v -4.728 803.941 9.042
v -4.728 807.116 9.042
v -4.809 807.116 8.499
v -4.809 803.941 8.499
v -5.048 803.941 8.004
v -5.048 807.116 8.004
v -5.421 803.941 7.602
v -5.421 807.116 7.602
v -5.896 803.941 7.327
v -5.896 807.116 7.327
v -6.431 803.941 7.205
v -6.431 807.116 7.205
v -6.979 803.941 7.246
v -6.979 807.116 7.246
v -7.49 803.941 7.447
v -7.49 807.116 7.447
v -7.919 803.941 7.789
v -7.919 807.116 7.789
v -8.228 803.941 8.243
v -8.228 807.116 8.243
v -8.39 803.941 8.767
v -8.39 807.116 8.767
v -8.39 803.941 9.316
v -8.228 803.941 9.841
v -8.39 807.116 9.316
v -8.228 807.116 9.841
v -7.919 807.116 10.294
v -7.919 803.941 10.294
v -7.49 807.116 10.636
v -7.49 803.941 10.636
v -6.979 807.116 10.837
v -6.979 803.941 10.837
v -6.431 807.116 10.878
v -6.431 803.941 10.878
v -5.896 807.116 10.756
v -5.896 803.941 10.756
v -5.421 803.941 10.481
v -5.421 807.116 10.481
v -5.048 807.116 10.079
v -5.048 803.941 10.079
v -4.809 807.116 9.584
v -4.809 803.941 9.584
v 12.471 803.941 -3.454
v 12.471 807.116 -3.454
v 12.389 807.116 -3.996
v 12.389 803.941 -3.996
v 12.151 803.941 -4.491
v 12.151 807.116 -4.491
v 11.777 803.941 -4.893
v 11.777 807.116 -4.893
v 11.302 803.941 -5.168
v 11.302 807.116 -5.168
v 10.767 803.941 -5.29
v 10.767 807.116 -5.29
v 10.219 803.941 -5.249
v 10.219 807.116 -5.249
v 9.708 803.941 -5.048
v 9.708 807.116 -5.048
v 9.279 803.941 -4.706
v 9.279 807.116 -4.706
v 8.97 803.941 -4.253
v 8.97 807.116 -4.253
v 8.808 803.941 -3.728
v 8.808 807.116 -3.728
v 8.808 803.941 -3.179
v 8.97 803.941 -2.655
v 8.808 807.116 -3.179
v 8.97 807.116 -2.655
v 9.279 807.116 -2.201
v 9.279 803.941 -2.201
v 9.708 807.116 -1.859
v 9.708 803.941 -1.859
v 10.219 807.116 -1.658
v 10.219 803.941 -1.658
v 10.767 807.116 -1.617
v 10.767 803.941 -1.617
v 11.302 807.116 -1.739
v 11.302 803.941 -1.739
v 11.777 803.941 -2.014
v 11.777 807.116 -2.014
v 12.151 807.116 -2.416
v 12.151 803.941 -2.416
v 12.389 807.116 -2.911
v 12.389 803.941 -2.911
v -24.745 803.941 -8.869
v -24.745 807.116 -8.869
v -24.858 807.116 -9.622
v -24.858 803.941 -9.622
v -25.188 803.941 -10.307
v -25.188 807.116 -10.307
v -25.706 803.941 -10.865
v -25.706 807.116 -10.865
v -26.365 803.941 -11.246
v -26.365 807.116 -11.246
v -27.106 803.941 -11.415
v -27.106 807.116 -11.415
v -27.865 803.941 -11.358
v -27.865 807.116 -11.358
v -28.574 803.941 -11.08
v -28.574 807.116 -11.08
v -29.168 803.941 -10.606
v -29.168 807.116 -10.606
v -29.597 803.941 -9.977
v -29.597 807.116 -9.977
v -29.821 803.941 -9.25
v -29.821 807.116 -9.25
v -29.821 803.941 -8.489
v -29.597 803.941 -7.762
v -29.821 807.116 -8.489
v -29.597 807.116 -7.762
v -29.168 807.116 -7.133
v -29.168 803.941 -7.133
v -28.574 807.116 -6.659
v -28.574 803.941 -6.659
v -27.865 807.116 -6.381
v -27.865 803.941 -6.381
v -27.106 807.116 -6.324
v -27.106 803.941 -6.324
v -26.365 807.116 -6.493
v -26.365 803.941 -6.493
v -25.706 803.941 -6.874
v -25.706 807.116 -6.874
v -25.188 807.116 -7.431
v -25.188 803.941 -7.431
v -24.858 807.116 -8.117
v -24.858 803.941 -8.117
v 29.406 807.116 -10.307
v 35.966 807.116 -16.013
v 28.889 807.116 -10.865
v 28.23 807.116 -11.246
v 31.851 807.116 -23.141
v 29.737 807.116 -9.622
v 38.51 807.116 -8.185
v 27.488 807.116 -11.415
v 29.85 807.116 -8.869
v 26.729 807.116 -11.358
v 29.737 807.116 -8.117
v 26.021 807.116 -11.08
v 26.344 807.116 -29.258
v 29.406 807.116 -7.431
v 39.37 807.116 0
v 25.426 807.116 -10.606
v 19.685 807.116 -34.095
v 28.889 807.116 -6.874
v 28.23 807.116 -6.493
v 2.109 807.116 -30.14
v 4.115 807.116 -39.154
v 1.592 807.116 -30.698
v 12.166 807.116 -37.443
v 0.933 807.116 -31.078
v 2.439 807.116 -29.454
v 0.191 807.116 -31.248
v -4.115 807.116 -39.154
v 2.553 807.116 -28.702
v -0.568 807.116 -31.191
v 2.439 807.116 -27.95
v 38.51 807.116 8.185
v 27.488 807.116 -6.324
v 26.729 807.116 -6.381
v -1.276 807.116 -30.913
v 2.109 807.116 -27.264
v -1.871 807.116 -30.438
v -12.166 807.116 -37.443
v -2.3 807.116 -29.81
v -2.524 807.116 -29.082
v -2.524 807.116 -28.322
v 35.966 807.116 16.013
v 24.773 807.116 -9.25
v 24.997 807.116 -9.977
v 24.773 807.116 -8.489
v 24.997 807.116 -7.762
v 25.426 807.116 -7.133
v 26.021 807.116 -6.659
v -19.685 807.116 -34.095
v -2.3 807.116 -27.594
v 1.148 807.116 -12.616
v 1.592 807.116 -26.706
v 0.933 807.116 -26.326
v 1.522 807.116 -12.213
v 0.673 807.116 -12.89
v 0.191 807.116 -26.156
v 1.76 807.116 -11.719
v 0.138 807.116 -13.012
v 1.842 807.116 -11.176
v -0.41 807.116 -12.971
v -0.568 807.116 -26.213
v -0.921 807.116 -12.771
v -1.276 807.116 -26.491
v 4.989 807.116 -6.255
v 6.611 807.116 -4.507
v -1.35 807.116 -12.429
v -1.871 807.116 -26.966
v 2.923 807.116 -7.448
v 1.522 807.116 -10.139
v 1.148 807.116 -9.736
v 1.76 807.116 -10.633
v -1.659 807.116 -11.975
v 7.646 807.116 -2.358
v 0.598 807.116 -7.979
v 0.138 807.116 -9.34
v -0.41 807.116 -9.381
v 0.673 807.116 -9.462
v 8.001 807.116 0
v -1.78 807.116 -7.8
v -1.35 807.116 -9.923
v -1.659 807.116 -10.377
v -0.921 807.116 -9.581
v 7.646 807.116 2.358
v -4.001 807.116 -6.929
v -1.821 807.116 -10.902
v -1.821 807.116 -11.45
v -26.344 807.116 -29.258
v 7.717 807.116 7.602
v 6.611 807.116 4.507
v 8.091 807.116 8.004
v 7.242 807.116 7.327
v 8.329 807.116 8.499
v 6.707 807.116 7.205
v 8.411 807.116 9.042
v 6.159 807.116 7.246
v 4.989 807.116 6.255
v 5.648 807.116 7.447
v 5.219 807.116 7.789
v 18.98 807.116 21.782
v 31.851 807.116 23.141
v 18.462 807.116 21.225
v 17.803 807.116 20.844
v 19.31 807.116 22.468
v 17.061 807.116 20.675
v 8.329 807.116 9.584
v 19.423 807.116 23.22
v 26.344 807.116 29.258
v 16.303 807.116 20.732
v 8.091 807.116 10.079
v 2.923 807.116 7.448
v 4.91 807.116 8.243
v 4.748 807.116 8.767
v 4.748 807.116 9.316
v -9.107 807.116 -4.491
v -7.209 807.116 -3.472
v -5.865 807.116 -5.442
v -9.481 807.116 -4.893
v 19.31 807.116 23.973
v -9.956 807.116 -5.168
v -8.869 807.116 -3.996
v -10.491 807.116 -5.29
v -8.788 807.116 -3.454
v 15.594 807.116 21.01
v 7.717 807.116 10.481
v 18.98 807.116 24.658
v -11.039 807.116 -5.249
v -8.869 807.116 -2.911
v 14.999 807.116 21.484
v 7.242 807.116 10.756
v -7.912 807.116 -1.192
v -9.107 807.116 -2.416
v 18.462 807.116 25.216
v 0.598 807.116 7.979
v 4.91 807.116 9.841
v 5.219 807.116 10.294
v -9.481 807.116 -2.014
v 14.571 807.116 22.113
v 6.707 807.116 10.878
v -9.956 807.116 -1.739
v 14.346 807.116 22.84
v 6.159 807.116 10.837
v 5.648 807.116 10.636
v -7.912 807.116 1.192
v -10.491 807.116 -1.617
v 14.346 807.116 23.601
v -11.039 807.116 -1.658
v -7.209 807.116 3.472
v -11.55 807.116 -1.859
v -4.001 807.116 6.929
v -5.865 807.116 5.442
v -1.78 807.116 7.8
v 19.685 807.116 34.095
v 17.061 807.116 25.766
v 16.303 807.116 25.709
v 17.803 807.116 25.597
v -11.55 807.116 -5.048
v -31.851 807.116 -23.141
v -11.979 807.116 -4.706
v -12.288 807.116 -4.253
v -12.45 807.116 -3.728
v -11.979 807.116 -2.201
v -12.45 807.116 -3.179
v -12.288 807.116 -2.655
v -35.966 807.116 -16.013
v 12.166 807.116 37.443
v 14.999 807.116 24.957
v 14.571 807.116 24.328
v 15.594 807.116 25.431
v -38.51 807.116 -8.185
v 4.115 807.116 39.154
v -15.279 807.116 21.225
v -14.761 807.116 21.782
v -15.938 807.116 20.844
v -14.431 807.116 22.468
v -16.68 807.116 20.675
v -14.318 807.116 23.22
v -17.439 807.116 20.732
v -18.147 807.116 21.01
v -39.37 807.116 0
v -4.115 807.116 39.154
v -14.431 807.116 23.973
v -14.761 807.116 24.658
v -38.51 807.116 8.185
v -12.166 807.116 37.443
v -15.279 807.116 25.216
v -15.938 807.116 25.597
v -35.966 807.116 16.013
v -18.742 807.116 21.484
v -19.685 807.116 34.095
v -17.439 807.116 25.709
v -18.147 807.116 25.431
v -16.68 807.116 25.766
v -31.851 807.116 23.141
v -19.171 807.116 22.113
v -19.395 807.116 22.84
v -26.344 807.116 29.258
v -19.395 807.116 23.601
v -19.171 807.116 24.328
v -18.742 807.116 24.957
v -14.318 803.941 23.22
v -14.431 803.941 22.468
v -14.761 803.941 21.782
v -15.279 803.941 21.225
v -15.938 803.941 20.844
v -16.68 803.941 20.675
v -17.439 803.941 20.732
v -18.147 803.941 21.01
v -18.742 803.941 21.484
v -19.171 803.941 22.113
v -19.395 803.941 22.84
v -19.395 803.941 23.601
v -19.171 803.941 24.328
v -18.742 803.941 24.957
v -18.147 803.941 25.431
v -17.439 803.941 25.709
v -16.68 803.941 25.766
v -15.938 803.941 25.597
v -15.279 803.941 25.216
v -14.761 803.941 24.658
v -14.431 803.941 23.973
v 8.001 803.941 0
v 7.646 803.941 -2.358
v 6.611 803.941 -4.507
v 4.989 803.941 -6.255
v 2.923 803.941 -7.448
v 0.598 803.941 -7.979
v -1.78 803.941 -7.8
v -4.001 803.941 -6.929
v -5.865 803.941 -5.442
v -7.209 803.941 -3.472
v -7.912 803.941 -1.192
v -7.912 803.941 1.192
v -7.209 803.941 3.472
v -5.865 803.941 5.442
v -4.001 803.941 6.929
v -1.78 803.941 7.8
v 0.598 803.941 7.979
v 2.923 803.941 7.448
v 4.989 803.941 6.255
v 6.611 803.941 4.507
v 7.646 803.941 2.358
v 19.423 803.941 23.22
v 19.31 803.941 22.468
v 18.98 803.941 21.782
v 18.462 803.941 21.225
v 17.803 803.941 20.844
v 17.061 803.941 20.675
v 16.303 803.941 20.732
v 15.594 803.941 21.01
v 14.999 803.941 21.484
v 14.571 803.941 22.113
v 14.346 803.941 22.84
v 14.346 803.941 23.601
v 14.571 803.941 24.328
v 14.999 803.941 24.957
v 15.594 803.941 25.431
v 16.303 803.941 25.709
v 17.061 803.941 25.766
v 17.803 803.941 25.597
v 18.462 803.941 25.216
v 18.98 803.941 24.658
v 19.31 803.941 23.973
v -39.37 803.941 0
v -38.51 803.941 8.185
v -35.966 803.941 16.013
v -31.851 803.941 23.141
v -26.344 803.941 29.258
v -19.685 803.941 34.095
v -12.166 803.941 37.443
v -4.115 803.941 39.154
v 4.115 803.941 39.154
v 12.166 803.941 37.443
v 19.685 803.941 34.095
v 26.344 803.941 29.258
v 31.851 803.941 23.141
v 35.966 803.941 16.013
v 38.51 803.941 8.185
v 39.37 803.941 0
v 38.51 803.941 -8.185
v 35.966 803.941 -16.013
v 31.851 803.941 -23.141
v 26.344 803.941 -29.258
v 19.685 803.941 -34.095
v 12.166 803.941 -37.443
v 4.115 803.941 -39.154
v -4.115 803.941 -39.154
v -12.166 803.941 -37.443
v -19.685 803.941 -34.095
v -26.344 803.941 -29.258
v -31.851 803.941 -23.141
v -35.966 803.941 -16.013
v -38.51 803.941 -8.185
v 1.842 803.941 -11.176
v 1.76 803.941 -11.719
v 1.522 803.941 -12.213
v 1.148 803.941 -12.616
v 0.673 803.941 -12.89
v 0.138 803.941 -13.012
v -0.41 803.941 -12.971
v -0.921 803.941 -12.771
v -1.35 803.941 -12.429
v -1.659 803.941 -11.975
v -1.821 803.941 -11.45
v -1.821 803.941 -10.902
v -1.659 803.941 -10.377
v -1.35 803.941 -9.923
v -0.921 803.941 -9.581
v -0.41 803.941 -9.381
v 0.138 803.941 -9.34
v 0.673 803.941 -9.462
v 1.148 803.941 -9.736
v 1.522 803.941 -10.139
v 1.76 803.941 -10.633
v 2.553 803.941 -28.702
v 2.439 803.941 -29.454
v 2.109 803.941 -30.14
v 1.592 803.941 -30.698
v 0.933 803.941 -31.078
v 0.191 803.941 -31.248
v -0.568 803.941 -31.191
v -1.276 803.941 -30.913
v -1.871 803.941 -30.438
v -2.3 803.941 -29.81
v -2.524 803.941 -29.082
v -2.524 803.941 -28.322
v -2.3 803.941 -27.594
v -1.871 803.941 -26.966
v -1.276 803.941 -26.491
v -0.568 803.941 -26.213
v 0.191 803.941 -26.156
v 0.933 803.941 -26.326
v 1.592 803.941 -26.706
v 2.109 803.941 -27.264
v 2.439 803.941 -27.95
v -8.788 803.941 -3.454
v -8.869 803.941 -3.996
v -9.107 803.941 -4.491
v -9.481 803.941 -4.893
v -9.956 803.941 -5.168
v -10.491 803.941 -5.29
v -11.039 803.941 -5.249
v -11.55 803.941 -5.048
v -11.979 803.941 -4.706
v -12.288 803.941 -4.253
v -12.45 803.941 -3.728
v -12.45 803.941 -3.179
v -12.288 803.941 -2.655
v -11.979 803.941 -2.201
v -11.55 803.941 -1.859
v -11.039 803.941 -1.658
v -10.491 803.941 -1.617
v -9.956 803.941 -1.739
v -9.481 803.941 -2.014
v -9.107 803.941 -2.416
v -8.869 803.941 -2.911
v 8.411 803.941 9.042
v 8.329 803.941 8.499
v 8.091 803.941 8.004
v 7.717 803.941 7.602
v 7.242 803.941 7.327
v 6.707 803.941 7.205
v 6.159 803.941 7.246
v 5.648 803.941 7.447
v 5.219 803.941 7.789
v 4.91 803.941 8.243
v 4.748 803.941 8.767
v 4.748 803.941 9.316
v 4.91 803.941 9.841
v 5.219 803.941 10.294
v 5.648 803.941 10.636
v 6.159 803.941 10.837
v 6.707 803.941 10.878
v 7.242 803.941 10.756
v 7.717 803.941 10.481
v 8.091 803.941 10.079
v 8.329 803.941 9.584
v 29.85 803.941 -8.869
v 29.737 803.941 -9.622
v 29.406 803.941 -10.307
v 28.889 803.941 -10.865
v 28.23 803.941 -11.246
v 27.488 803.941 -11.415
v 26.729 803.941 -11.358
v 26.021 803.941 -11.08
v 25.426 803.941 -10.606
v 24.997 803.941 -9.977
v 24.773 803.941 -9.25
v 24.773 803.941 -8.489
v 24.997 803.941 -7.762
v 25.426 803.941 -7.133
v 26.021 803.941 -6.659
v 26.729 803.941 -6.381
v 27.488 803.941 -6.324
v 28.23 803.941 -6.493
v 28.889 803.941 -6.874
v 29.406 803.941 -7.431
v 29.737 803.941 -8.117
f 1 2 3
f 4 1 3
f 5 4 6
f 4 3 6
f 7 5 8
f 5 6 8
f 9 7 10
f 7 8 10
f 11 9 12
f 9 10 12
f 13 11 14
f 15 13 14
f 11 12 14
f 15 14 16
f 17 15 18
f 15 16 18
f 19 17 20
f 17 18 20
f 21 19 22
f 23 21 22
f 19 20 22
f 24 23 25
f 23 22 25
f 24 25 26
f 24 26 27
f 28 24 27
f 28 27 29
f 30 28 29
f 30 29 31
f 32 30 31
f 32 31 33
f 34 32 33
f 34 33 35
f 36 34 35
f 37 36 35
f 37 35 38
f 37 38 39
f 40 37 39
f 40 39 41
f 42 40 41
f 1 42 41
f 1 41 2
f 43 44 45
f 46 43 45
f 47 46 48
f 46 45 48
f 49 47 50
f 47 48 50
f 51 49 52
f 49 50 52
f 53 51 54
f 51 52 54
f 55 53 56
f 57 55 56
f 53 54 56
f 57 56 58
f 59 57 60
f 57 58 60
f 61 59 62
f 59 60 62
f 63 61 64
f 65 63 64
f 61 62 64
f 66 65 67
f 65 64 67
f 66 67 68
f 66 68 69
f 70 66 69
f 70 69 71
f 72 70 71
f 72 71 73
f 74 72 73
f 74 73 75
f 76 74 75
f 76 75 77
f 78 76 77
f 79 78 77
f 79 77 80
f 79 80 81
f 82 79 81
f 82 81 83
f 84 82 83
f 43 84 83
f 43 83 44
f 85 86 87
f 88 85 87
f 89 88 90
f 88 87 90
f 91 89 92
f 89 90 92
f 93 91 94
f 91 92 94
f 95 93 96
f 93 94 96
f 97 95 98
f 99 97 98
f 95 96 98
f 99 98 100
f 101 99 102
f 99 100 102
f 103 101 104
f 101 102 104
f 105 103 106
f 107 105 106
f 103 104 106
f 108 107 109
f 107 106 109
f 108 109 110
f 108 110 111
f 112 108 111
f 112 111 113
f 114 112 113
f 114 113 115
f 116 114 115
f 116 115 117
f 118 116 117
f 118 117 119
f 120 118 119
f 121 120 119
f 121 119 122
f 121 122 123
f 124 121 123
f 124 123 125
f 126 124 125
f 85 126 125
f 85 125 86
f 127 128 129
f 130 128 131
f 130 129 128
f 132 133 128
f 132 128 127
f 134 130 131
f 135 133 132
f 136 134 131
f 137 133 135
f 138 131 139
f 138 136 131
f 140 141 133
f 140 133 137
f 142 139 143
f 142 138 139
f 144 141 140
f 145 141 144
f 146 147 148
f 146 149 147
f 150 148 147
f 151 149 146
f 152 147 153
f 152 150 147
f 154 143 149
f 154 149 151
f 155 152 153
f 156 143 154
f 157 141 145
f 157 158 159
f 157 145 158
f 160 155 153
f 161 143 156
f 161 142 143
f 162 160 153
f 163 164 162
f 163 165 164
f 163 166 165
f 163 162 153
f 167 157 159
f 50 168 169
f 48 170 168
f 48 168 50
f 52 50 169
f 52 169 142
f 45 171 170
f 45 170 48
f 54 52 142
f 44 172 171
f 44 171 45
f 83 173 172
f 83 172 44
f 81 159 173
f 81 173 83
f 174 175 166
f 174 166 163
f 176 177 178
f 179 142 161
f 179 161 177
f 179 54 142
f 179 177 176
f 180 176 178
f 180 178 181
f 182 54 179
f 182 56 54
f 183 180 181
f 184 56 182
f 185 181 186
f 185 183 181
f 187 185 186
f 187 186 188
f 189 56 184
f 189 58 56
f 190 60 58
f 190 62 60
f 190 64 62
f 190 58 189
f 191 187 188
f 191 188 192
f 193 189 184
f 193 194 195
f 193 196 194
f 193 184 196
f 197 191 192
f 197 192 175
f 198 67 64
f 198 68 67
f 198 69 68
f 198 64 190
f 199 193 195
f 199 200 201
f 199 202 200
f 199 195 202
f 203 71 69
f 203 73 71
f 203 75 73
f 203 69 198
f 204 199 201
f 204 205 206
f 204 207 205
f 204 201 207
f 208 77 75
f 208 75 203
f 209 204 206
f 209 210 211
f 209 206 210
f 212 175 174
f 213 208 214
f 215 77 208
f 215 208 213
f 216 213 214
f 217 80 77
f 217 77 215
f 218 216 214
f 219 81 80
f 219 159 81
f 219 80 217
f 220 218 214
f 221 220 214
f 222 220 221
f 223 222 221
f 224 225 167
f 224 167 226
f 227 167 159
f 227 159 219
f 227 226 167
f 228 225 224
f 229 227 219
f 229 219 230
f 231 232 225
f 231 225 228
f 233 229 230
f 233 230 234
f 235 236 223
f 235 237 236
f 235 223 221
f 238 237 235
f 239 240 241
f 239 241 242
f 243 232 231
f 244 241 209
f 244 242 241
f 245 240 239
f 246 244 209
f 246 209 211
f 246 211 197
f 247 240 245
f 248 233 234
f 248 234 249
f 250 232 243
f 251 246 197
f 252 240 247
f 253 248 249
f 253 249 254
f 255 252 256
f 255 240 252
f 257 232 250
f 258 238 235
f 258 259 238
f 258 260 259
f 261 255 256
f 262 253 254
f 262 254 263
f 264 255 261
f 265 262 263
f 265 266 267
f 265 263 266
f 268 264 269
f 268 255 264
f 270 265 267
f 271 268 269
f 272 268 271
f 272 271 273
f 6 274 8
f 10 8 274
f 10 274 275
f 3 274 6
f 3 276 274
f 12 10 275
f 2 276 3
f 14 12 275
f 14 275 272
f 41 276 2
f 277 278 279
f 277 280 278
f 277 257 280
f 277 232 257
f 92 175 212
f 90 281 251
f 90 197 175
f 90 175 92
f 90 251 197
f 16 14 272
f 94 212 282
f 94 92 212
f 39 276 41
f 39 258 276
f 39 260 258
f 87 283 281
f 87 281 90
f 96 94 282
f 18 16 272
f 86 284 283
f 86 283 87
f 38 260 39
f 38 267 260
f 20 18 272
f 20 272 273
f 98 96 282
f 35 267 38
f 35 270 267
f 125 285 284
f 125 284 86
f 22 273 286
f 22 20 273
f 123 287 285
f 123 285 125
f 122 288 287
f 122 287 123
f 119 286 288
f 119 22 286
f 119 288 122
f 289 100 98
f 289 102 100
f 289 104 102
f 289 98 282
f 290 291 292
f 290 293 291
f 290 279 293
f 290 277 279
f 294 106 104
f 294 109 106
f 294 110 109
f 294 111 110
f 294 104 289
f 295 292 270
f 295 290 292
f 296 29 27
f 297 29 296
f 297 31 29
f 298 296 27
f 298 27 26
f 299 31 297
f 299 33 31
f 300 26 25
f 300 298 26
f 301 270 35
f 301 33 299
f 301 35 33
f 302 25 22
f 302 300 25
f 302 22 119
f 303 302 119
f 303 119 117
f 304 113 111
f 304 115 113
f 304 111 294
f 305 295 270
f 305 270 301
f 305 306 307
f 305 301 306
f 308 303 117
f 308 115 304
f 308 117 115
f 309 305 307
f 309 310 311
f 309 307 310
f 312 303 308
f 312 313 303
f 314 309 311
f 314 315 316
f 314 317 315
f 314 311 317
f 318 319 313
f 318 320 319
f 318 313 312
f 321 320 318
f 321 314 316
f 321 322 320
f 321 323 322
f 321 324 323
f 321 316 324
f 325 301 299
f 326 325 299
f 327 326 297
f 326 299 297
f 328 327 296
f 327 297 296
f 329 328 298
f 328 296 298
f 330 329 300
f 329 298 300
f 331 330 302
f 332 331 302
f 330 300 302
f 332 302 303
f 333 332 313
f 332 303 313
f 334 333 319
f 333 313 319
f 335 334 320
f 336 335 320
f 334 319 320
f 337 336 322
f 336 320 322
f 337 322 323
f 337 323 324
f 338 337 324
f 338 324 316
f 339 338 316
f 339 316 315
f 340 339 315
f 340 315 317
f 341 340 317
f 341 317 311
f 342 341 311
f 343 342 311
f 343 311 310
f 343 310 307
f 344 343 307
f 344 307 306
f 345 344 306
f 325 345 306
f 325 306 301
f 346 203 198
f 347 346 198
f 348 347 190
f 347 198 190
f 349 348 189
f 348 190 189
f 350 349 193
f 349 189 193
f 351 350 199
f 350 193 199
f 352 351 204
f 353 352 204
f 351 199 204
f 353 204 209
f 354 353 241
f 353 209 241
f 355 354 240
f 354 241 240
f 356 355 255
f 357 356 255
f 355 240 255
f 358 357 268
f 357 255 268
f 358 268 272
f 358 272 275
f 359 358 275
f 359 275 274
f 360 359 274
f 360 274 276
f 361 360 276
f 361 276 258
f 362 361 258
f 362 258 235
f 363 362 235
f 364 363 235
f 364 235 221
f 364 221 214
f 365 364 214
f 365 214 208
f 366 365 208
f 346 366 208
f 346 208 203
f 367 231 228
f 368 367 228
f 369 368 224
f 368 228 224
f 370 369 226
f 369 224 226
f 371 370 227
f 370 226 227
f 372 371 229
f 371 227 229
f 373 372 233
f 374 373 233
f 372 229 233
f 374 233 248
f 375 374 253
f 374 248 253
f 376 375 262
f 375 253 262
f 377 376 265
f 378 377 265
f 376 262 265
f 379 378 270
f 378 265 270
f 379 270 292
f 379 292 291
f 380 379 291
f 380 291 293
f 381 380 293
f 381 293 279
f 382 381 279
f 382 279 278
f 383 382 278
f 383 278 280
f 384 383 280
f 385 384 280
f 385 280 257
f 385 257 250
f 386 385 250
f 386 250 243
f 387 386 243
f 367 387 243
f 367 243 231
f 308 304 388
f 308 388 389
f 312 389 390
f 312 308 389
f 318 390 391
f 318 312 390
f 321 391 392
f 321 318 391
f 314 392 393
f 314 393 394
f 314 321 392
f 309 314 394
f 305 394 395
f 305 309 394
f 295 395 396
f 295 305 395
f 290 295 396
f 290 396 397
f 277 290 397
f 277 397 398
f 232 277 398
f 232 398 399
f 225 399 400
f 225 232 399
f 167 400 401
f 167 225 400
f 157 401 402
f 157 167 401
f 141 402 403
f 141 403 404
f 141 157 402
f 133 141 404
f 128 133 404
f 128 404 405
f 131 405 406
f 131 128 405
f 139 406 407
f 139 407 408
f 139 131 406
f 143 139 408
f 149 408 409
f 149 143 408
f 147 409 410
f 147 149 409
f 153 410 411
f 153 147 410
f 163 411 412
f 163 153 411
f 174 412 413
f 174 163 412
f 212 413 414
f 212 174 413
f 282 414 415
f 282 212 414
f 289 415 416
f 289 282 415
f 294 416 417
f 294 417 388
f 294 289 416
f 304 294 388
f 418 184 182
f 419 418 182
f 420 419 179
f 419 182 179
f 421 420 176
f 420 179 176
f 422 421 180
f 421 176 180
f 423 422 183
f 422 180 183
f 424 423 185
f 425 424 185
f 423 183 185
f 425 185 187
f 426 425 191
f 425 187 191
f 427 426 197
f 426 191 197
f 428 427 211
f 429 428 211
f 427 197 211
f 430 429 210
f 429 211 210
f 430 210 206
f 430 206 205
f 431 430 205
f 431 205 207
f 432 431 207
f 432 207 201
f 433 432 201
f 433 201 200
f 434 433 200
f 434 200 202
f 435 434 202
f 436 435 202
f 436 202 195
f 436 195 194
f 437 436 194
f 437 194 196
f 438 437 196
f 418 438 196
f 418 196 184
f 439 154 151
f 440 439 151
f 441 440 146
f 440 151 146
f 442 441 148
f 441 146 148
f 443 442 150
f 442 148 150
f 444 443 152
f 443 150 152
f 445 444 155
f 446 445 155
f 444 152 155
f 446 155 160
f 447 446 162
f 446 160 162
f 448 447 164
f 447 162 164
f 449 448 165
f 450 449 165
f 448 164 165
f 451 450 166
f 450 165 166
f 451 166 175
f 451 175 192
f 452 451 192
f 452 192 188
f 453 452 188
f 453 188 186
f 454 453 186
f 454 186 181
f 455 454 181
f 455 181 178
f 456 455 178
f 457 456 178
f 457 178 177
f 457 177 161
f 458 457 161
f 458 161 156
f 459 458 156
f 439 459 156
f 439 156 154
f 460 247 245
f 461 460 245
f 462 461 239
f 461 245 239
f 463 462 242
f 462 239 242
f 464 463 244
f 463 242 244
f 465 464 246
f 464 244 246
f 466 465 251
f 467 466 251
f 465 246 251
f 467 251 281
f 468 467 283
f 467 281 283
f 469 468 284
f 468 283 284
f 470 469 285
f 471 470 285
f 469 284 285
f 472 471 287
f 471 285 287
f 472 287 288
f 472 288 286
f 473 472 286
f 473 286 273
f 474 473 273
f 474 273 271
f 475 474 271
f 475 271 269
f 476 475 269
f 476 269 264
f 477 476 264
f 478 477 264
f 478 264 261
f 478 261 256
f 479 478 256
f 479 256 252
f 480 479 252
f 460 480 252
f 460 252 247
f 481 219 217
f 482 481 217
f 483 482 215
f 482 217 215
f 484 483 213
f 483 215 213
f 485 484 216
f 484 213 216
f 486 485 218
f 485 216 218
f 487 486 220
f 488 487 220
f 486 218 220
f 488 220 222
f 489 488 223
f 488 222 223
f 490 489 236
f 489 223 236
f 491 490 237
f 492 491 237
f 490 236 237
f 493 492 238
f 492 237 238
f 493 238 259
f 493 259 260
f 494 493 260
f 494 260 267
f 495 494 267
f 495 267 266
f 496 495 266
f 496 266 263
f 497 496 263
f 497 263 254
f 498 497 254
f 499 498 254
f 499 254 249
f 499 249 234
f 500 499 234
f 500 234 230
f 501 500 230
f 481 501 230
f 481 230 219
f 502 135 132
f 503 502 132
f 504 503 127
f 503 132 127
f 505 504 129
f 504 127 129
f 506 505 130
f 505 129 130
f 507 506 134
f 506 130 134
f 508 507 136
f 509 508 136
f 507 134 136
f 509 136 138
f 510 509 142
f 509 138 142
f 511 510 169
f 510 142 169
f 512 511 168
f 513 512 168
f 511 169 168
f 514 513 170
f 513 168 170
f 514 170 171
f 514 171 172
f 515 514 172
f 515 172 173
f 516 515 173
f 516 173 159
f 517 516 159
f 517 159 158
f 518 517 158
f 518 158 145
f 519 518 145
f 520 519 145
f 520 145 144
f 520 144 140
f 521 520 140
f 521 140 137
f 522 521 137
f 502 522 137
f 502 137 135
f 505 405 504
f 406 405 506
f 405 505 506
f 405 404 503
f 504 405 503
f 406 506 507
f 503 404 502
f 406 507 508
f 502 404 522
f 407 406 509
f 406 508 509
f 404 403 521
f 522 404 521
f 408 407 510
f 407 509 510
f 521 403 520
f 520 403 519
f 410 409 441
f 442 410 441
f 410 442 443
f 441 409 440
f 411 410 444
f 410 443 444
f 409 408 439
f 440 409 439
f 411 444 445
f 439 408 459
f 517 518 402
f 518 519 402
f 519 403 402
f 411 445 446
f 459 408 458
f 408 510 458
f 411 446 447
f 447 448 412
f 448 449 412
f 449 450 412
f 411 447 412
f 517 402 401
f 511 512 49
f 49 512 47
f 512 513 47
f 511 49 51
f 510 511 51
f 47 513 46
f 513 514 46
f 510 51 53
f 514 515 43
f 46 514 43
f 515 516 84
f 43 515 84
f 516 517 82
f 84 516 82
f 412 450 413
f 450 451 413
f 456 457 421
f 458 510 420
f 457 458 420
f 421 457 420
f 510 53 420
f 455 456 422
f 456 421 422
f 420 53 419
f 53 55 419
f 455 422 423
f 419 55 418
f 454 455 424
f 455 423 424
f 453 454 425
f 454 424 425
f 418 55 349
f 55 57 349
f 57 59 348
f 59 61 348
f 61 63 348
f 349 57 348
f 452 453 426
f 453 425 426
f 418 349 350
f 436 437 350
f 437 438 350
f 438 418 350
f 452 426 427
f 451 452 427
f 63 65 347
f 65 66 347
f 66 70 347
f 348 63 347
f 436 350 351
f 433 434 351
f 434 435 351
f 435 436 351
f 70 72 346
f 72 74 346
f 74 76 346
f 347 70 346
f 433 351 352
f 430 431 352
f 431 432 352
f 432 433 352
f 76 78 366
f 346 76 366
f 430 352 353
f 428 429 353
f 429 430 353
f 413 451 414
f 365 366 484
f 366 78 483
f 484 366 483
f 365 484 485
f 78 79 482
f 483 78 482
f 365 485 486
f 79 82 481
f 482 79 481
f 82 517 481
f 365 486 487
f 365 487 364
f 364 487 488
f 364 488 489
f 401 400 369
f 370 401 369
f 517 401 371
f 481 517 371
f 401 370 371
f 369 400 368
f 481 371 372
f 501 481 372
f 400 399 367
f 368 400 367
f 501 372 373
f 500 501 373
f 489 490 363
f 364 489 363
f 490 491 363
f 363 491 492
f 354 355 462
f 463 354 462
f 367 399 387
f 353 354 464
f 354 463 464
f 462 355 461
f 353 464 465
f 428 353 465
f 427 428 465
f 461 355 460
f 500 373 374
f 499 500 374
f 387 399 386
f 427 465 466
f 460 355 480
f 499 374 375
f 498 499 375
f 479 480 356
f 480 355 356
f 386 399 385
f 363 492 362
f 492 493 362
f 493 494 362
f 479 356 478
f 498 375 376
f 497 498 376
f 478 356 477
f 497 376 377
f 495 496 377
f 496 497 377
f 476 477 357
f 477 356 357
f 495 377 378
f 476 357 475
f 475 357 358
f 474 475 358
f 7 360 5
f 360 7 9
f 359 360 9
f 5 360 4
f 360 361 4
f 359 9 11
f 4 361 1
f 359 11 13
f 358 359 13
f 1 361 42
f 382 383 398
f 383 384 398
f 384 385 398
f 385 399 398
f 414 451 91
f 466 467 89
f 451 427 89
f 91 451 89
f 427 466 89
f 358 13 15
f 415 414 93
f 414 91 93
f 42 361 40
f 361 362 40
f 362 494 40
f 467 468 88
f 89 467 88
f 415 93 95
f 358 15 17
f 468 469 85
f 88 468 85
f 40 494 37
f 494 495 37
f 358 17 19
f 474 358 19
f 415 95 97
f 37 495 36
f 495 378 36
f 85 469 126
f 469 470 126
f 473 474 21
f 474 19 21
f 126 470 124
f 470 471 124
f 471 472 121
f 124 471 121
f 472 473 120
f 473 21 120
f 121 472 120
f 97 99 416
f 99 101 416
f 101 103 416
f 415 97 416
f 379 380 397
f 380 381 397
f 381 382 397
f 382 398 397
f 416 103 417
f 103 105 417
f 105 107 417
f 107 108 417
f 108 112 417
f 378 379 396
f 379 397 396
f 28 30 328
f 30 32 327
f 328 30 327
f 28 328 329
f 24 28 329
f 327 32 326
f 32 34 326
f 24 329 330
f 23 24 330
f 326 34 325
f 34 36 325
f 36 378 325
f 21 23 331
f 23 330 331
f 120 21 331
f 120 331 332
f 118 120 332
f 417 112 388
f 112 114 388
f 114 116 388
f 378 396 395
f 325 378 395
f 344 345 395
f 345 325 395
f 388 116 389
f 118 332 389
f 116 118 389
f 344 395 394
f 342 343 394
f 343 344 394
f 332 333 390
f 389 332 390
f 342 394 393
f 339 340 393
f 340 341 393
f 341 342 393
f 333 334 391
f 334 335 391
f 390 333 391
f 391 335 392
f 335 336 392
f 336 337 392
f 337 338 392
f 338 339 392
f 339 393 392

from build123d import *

# Parameters (mm, degrees)
SKETCH1_R           = 39.37
BOSS_EXTRUDE1_DEPTH = 3.175
SKETCH2_R           = 8.001
SKETCH2_R_2         = 1.8415
SKETCH2_R_3         = 2.5527
CUT_EXTRUDE1_DEPTH  = 4.175


with BuildPart() as part:
    # Sketch1 → Boss-Extrude1 (new body)
    with BuildSketch(Plane(origin=(0, 807.11642412, 0), x_dir=(-1, 0, 0), z_dir=(0, 1, 0))):
        Circle(SKETCH1_R)
    extrude(amount=-BOSS_EXTRUDE1_DEPTH)

    # Sketch2 → Cut-Extrude1 (cut, through all)
    with BuildSketch(Plane(origin=(0, 807.11642412, 0), x_dir=(1, 0, 0), z_dir=(0, 1, 0))):
        Circle(SKETCH2_R)
        with Locations((0, 11.176)):
            Circle(SKETCH2_R_2)
        with Locations((10.629007626, 3.453573929)):
            Circle(SKETCH2_R_2)
        with Locations((6.56908798, -9.041573929)):
            Circle(SKETCH2_R_2)
        with Locations((-6.56908798, -9.041573929)):
            Circle(SKETCH2_R_2)
        with Locations((-10.629007626, 3.453573929)):
            Circle(SKETCH2_R_2)
        with Locations((0, 28.702)):
            Circle(SKETCH2_R_3)
        with Locations((27.297224131, 8.869405773)):
            Circle(SKETCH2_R_3)
        with Locations((16.870612311, -23.220405773)):
            Circle(SKETCH2_R_3)
        with Locations((-16.870612311, -23.220405773)):
            Circle(SKETCH2_R_3)
        with Locations((-27.297224131, 8.869405773)):
            Circle(SKETCH2_R_3)
    extrude(amount=-CUT_EXTRUDE1_DEPTH, mode=Mode.SUBTRACT)


solid = part.part
